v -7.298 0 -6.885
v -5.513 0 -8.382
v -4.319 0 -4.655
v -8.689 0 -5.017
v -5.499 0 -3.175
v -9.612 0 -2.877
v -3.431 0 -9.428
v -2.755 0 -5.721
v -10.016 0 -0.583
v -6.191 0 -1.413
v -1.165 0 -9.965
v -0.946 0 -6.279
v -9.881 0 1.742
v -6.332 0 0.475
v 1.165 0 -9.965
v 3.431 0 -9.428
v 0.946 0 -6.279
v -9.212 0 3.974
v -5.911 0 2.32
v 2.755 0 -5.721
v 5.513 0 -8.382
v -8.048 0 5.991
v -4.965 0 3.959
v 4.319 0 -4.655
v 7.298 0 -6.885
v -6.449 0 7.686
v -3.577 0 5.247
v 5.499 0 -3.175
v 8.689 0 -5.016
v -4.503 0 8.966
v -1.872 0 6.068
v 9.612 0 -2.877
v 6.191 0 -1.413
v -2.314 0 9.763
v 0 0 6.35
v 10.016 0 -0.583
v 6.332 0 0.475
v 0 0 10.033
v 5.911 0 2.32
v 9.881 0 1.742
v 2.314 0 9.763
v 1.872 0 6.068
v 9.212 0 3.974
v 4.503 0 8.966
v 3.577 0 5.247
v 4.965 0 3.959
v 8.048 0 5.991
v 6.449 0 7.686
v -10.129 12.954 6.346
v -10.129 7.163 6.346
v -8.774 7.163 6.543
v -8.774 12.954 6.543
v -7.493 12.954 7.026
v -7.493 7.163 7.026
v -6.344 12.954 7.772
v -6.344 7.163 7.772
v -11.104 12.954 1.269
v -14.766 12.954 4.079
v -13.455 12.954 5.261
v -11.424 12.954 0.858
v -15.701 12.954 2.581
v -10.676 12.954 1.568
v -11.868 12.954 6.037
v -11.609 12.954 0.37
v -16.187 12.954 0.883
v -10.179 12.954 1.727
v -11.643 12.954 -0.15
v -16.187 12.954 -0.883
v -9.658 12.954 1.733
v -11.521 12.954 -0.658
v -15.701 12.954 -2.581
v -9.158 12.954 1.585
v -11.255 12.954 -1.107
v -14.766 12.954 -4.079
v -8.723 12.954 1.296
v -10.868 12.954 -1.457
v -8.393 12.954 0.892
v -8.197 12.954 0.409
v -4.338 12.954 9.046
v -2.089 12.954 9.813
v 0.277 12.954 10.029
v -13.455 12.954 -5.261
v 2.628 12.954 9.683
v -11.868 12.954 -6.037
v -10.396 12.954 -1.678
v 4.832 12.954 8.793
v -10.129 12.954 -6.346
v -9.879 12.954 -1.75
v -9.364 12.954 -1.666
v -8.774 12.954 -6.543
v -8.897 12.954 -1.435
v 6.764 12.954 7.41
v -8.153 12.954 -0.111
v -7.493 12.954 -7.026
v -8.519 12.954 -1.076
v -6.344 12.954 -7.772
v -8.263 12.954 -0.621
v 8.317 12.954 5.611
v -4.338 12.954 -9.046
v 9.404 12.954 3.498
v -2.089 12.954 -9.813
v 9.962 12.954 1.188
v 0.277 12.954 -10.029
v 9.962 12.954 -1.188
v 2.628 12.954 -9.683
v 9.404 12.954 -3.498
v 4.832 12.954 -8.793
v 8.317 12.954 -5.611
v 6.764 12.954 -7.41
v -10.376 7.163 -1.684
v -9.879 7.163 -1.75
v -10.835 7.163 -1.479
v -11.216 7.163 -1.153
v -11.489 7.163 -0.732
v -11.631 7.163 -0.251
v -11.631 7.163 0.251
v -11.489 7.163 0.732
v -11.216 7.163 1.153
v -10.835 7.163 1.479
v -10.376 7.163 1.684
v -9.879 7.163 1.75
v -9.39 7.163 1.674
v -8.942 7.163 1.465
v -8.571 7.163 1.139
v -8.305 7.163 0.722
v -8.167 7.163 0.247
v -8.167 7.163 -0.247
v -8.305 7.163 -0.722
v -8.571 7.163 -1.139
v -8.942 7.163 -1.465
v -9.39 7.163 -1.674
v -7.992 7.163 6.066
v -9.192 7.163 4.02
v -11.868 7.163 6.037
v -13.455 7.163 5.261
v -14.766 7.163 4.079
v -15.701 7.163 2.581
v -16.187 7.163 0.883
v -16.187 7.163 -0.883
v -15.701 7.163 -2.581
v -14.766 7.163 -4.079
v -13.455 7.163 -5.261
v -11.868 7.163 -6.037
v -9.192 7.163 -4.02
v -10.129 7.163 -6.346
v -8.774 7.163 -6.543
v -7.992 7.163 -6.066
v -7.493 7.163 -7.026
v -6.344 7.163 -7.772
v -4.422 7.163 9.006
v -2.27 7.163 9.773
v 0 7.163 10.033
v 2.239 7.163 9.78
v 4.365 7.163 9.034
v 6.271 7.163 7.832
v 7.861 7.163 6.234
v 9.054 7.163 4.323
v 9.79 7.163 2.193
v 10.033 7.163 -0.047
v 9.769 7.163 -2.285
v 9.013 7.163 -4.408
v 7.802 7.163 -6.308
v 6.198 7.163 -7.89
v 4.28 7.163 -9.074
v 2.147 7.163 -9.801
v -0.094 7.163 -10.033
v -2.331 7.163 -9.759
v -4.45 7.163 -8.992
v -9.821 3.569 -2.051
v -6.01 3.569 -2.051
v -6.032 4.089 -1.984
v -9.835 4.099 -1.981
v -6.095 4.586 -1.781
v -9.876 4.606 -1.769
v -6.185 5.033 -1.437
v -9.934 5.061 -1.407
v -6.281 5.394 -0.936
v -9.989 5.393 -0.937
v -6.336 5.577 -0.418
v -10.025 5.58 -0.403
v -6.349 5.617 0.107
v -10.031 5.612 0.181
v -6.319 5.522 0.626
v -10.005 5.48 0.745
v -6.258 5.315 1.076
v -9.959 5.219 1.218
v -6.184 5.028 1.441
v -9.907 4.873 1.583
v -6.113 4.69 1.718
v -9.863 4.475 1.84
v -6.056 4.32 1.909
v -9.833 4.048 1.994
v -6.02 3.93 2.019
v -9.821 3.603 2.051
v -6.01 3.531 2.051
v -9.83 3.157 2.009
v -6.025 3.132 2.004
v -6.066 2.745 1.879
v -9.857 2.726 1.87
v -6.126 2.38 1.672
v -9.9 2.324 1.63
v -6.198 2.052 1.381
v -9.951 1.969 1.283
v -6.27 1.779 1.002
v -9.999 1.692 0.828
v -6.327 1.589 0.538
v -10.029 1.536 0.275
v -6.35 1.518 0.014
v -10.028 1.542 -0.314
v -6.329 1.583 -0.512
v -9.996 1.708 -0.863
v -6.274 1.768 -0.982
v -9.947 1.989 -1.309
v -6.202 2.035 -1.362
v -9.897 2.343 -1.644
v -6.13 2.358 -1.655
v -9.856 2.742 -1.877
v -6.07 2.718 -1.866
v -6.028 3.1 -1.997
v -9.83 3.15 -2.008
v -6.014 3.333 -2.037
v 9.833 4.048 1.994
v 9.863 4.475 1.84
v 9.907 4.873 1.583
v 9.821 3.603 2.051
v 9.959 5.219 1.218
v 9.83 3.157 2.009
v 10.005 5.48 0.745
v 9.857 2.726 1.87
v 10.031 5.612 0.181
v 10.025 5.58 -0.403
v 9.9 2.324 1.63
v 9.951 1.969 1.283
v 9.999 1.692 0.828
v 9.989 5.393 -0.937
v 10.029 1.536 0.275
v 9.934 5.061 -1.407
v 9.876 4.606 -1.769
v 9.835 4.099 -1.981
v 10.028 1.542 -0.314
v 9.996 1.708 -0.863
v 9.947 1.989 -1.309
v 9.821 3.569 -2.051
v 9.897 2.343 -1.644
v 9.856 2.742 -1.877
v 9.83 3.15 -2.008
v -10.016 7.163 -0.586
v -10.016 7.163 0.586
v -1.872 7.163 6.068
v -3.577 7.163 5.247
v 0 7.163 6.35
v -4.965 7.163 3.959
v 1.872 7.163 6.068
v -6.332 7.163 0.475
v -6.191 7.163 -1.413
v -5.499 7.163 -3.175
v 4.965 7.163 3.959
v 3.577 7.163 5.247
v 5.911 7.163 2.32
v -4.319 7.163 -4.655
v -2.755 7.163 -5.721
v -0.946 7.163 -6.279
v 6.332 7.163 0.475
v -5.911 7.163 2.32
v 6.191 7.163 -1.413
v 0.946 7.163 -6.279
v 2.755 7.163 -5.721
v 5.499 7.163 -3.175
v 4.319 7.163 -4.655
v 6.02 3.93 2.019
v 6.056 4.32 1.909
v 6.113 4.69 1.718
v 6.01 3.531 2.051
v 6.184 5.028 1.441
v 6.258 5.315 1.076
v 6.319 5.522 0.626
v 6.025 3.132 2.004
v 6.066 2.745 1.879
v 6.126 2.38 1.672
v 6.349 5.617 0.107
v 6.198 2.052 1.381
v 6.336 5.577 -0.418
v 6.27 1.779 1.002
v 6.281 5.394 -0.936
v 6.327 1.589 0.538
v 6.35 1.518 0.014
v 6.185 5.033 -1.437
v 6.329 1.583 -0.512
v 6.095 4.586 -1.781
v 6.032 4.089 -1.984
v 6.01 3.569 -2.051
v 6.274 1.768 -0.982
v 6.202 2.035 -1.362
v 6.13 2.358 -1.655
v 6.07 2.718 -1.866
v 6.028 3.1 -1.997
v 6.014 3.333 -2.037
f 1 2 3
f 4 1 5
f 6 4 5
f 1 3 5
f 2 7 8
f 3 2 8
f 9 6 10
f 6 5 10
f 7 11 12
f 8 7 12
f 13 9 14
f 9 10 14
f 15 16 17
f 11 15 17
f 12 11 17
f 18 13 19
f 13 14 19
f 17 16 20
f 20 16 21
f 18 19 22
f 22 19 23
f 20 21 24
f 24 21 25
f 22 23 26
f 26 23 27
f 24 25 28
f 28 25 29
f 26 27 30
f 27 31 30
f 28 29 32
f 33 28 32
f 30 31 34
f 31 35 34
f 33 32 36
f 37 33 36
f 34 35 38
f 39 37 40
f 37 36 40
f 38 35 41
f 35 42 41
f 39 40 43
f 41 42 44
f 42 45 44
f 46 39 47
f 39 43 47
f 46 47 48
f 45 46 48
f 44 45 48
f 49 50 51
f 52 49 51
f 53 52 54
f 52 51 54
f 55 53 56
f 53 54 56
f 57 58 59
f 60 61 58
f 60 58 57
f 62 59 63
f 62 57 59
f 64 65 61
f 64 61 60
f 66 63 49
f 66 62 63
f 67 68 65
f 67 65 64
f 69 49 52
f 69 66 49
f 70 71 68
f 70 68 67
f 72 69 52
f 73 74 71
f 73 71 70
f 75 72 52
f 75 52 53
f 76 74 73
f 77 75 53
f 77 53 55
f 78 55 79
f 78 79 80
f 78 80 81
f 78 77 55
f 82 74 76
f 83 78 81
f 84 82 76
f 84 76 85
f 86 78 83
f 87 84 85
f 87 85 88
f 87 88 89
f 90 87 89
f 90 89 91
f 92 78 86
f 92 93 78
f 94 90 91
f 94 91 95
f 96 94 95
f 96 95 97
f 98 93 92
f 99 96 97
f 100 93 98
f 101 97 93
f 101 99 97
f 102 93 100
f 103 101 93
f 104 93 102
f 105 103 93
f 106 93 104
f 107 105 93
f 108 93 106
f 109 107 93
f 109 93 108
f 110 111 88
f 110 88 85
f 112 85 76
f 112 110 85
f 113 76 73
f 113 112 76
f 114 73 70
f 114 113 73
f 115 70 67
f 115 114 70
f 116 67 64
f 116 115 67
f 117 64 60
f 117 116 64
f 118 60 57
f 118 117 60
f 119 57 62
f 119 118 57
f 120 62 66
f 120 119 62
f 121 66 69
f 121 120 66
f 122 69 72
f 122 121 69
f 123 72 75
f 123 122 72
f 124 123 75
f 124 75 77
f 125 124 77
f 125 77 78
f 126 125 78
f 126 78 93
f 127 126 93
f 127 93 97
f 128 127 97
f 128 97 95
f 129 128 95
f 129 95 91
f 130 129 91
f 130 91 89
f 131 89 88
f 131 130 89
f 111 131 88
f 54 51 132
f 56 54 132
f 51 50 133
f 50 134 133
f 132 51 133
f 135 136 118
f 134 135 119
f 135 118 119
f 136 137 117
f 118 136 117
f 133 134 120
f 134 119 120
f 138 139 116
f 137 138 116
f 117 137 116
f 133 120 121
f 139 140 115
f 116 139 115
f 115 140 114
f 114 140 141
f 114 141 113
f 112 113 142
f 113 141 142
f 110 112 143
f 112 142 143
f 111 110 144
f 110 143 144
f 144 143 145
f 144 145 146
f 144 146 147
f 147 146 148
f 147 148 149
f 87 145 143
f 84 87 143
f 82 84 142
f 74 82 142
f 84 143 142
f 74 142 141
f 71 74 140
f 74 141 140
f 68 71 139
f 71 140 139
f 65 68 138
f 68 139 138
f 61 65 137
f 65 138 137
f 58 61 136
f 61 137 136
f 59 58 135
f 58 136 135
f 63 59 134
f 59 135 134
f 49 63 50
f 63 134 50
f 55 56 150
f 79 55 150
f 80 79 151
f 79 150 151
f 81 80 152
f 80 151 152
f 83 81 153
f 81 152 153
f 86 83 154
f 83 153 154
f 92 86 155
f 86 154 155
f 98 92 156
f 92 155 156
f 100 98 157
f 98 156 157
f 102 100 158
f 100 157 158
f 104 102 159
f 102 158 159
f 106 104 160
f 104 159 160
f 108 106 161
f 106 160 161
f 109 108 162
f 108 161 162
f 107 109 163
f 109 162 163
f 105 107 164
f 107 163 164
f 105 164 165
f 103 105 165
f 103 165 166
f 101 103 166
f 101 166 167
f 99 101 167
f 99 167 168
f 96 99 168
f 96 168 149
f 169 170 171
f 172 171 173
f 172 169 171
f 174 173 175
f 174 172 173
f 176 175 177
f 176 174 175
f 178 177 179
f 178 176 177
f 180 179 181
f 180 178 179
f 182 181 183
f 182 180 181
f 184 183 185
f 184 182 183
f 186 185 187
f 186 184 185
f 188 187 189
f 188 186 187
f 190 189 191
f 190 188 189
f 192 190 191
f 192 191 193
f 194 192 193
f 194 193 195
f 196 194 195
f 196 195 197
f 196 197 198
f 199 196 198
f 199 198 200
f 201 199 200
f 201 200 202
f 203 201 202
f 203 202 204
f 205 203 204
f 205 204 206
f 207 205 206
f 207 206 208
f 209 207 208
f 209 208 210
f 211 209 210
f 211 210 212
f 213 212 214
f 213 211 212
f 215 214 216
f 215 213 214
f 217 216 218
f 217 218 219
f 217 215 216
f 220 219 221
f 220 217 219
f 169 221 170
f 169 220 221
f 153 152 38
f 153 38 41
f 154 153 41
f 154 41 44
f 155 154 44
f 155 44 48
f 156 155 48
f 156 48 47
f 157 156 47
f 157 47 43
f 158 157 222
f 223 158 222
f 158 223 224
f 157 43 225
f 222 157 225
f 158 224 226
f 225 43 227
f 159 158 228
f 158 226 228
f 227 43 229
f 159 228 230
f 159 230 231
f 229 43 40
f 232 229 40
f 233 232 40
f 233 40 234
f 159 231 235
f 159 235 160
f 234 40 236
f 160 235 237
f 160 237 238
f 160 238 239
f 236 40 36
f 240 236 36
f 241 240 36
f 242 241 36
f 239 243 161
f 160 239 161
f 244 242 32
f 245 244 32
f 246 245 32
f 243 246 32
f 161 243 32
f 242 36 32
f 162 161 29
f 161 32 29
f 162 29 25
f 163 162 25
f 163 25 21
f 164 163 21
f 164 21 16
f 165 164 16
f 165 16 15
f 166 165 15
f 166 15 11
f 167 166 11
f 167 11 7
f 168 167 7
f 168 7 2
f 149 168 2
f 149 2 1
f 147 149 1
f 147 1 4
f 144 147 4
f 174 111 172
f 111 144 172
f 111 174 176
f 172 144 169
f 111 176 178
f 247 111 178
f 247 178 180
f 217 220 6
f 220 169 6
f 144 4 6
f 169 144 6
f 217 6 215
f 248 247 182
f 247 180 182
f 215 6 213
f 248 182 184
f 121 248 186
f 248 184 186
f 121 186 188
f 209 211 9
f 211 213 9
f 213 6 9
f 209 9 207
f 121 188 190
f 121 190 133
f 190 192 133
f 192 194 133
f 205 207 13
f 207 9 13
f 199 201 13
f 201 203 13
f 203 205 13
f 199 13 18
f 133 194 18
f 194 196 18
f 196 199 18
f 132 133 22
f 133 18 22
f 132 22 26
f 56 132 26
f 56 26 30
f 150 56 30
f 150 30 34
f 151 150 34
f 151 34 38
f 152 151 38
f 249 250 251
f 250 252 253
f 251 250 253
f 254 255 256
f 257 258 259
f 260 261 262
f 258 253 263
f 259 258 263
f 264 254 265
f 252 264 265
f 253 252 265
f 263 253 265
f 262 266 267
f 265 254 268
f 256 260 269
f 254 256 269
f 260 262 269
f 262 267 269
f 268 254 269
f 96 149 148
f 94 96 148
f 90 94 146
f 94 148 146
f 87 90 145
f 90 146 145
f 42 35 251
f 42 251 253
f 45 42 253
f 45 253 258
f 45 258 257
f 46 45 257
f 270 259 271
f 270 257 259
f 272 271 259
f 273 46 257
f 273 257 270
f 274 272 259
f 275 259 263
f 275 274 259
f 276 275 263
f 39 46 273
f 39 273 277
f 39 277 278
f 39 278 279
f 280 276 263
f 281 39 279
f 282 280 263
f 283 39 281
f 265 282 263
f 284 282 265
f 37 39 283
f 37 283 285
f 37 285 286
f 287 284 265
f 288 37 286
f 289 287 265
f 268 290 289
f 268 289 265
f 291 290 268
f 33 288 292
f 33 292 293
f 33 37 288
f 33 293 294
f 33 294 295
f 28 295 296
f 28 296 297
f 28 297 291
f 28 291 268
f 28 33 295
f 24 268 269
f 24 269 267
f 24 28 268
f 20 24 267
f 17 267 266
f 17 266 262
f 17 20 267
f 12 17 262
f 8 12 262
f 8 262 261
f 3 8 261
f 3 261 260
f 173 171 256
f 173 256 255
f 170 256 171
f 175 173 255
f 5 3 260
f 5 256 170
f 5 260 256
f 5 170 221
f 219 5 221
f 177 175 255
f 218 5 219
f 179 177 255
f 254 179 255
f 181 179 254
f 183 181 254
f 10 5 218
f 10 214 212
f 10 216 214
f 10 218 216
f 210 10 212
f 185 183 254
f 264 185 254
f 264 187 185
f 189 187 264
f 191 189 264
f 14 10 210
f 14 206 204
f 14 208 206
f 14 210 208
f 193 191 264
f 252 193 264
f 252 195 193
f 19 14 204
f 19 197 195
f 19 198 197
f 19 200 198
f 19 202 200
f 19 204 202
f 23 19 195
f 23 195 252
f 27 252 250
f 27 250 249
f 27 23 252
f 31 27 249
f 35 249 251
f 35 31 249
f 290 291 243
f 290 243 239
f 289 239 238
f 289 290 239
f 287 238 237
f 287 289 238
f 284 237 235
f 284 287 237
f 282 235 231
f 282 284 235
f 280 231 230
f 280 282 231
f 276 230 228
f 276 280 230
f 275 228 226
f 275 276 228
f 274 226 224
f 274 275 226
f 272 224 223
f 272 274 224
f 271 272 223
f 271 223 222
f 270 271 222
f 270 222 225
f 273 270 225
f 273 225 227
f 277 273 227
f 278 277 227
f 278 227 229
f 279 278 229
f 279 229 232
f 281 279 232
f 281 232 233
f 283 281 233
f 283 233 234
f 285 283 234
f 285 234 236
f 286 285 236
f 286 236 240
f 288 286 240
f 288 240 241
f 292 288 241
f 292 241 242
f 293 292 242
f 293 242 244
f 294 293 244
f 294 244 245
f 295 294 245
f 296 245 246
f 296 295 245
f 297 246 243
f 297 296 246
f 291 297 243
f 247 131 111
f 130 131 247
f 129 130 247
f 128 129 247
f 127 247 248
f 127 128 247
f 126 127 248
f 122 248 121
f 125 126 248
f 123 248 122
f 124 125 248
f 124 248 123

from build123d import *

# Parameters (mm, degrees)
SKETCH1_R               = 10.033
SKETCH1_R_2             = 6.35
BOSS_EXTRUDE1_DEPTH     = 7.1628
CUT_EXTRUDE1_DEPTH      = 16.894271982
CUT_EXTRUDE1_DEPTH_BACK = 16.894271982
SKETCH2_R               = 2.05105
SKETCH3_R               = 1.75
BOSS_EXTRUDE2_DEPTH     = 5.7912


with BuildPart() as part:
    # Sketch1 → Boss-Extrude1 (new body)
    with BuildSketch(Plane(origin=(0, 0, 0), x_dir=(1, 0, 0), z_dir=(0, 1, 0))):
        with Locations(Location((0, 0, 0), (0, 0, 270))):
            Circle(SKETCH1_R)
        with Locations(Location((0, 0, 0), (0, 0, 270))):
            Circle(SKETCH1_R_2, mode=Mode.SUBTRACT)
    extrude(amount=BOSS_EXTRUDE1_DEPTH)

    # Sketch2 → Cut-Extrude1 (cut, two sides: drawn at the far end of the back side and taken through both)
    with BuildSketch(Plane(origin=(0, 0, 0), x_dir=(0, 0, -1), z_dir=(1, 0, 0)).offset(-CUT_EXTRUDE1_DEPTH_BACK)):
        with Locations((0, 3.5687)):
            Circle(SKETCH2_R)
    extrude(amount=CUT_EXTRUDE1_DEPTH + CUT_EXTRUDE1_DEPTH_BACK, mode=Mode.SUBTRACT)

    # Sketch3 → Boss-Extrude2 (add)
    with BuildSketch(Plane(origin=(0, 7.1628, 0), x_dir=(1, 0, 0), z_dir=(0, 1, 0))):
        with BuildLine():
            ThreePointArc((-6.34436033, -7.772398665), (10.033, 0), (-6.34436033, 7.772398665))
            ThreePointArc((-6.34436033, 7.772398665), (-8.120246687, 6.749669096), (-10.12938913, 6.345819163))
            ThreePointArc((-10.12938913, 6.345819163), (-16.249, 0), (-10.12938913, -6.345819163))
            ThreePointArc((-10.12938913, -6.345819163), (-8.120246687, -6.749669096), (-6.34436033, -7.772398665))
        make_face()
        with Locations(Location((-9.899, 0, 0), (0, 0, 89.352367696))):
            Circle(SKETCH3_R, mode=Mode.SUBTRACT)
    extrude(amount=BOSS_EXTRUDE2_DEPTH)


solid = part.part
